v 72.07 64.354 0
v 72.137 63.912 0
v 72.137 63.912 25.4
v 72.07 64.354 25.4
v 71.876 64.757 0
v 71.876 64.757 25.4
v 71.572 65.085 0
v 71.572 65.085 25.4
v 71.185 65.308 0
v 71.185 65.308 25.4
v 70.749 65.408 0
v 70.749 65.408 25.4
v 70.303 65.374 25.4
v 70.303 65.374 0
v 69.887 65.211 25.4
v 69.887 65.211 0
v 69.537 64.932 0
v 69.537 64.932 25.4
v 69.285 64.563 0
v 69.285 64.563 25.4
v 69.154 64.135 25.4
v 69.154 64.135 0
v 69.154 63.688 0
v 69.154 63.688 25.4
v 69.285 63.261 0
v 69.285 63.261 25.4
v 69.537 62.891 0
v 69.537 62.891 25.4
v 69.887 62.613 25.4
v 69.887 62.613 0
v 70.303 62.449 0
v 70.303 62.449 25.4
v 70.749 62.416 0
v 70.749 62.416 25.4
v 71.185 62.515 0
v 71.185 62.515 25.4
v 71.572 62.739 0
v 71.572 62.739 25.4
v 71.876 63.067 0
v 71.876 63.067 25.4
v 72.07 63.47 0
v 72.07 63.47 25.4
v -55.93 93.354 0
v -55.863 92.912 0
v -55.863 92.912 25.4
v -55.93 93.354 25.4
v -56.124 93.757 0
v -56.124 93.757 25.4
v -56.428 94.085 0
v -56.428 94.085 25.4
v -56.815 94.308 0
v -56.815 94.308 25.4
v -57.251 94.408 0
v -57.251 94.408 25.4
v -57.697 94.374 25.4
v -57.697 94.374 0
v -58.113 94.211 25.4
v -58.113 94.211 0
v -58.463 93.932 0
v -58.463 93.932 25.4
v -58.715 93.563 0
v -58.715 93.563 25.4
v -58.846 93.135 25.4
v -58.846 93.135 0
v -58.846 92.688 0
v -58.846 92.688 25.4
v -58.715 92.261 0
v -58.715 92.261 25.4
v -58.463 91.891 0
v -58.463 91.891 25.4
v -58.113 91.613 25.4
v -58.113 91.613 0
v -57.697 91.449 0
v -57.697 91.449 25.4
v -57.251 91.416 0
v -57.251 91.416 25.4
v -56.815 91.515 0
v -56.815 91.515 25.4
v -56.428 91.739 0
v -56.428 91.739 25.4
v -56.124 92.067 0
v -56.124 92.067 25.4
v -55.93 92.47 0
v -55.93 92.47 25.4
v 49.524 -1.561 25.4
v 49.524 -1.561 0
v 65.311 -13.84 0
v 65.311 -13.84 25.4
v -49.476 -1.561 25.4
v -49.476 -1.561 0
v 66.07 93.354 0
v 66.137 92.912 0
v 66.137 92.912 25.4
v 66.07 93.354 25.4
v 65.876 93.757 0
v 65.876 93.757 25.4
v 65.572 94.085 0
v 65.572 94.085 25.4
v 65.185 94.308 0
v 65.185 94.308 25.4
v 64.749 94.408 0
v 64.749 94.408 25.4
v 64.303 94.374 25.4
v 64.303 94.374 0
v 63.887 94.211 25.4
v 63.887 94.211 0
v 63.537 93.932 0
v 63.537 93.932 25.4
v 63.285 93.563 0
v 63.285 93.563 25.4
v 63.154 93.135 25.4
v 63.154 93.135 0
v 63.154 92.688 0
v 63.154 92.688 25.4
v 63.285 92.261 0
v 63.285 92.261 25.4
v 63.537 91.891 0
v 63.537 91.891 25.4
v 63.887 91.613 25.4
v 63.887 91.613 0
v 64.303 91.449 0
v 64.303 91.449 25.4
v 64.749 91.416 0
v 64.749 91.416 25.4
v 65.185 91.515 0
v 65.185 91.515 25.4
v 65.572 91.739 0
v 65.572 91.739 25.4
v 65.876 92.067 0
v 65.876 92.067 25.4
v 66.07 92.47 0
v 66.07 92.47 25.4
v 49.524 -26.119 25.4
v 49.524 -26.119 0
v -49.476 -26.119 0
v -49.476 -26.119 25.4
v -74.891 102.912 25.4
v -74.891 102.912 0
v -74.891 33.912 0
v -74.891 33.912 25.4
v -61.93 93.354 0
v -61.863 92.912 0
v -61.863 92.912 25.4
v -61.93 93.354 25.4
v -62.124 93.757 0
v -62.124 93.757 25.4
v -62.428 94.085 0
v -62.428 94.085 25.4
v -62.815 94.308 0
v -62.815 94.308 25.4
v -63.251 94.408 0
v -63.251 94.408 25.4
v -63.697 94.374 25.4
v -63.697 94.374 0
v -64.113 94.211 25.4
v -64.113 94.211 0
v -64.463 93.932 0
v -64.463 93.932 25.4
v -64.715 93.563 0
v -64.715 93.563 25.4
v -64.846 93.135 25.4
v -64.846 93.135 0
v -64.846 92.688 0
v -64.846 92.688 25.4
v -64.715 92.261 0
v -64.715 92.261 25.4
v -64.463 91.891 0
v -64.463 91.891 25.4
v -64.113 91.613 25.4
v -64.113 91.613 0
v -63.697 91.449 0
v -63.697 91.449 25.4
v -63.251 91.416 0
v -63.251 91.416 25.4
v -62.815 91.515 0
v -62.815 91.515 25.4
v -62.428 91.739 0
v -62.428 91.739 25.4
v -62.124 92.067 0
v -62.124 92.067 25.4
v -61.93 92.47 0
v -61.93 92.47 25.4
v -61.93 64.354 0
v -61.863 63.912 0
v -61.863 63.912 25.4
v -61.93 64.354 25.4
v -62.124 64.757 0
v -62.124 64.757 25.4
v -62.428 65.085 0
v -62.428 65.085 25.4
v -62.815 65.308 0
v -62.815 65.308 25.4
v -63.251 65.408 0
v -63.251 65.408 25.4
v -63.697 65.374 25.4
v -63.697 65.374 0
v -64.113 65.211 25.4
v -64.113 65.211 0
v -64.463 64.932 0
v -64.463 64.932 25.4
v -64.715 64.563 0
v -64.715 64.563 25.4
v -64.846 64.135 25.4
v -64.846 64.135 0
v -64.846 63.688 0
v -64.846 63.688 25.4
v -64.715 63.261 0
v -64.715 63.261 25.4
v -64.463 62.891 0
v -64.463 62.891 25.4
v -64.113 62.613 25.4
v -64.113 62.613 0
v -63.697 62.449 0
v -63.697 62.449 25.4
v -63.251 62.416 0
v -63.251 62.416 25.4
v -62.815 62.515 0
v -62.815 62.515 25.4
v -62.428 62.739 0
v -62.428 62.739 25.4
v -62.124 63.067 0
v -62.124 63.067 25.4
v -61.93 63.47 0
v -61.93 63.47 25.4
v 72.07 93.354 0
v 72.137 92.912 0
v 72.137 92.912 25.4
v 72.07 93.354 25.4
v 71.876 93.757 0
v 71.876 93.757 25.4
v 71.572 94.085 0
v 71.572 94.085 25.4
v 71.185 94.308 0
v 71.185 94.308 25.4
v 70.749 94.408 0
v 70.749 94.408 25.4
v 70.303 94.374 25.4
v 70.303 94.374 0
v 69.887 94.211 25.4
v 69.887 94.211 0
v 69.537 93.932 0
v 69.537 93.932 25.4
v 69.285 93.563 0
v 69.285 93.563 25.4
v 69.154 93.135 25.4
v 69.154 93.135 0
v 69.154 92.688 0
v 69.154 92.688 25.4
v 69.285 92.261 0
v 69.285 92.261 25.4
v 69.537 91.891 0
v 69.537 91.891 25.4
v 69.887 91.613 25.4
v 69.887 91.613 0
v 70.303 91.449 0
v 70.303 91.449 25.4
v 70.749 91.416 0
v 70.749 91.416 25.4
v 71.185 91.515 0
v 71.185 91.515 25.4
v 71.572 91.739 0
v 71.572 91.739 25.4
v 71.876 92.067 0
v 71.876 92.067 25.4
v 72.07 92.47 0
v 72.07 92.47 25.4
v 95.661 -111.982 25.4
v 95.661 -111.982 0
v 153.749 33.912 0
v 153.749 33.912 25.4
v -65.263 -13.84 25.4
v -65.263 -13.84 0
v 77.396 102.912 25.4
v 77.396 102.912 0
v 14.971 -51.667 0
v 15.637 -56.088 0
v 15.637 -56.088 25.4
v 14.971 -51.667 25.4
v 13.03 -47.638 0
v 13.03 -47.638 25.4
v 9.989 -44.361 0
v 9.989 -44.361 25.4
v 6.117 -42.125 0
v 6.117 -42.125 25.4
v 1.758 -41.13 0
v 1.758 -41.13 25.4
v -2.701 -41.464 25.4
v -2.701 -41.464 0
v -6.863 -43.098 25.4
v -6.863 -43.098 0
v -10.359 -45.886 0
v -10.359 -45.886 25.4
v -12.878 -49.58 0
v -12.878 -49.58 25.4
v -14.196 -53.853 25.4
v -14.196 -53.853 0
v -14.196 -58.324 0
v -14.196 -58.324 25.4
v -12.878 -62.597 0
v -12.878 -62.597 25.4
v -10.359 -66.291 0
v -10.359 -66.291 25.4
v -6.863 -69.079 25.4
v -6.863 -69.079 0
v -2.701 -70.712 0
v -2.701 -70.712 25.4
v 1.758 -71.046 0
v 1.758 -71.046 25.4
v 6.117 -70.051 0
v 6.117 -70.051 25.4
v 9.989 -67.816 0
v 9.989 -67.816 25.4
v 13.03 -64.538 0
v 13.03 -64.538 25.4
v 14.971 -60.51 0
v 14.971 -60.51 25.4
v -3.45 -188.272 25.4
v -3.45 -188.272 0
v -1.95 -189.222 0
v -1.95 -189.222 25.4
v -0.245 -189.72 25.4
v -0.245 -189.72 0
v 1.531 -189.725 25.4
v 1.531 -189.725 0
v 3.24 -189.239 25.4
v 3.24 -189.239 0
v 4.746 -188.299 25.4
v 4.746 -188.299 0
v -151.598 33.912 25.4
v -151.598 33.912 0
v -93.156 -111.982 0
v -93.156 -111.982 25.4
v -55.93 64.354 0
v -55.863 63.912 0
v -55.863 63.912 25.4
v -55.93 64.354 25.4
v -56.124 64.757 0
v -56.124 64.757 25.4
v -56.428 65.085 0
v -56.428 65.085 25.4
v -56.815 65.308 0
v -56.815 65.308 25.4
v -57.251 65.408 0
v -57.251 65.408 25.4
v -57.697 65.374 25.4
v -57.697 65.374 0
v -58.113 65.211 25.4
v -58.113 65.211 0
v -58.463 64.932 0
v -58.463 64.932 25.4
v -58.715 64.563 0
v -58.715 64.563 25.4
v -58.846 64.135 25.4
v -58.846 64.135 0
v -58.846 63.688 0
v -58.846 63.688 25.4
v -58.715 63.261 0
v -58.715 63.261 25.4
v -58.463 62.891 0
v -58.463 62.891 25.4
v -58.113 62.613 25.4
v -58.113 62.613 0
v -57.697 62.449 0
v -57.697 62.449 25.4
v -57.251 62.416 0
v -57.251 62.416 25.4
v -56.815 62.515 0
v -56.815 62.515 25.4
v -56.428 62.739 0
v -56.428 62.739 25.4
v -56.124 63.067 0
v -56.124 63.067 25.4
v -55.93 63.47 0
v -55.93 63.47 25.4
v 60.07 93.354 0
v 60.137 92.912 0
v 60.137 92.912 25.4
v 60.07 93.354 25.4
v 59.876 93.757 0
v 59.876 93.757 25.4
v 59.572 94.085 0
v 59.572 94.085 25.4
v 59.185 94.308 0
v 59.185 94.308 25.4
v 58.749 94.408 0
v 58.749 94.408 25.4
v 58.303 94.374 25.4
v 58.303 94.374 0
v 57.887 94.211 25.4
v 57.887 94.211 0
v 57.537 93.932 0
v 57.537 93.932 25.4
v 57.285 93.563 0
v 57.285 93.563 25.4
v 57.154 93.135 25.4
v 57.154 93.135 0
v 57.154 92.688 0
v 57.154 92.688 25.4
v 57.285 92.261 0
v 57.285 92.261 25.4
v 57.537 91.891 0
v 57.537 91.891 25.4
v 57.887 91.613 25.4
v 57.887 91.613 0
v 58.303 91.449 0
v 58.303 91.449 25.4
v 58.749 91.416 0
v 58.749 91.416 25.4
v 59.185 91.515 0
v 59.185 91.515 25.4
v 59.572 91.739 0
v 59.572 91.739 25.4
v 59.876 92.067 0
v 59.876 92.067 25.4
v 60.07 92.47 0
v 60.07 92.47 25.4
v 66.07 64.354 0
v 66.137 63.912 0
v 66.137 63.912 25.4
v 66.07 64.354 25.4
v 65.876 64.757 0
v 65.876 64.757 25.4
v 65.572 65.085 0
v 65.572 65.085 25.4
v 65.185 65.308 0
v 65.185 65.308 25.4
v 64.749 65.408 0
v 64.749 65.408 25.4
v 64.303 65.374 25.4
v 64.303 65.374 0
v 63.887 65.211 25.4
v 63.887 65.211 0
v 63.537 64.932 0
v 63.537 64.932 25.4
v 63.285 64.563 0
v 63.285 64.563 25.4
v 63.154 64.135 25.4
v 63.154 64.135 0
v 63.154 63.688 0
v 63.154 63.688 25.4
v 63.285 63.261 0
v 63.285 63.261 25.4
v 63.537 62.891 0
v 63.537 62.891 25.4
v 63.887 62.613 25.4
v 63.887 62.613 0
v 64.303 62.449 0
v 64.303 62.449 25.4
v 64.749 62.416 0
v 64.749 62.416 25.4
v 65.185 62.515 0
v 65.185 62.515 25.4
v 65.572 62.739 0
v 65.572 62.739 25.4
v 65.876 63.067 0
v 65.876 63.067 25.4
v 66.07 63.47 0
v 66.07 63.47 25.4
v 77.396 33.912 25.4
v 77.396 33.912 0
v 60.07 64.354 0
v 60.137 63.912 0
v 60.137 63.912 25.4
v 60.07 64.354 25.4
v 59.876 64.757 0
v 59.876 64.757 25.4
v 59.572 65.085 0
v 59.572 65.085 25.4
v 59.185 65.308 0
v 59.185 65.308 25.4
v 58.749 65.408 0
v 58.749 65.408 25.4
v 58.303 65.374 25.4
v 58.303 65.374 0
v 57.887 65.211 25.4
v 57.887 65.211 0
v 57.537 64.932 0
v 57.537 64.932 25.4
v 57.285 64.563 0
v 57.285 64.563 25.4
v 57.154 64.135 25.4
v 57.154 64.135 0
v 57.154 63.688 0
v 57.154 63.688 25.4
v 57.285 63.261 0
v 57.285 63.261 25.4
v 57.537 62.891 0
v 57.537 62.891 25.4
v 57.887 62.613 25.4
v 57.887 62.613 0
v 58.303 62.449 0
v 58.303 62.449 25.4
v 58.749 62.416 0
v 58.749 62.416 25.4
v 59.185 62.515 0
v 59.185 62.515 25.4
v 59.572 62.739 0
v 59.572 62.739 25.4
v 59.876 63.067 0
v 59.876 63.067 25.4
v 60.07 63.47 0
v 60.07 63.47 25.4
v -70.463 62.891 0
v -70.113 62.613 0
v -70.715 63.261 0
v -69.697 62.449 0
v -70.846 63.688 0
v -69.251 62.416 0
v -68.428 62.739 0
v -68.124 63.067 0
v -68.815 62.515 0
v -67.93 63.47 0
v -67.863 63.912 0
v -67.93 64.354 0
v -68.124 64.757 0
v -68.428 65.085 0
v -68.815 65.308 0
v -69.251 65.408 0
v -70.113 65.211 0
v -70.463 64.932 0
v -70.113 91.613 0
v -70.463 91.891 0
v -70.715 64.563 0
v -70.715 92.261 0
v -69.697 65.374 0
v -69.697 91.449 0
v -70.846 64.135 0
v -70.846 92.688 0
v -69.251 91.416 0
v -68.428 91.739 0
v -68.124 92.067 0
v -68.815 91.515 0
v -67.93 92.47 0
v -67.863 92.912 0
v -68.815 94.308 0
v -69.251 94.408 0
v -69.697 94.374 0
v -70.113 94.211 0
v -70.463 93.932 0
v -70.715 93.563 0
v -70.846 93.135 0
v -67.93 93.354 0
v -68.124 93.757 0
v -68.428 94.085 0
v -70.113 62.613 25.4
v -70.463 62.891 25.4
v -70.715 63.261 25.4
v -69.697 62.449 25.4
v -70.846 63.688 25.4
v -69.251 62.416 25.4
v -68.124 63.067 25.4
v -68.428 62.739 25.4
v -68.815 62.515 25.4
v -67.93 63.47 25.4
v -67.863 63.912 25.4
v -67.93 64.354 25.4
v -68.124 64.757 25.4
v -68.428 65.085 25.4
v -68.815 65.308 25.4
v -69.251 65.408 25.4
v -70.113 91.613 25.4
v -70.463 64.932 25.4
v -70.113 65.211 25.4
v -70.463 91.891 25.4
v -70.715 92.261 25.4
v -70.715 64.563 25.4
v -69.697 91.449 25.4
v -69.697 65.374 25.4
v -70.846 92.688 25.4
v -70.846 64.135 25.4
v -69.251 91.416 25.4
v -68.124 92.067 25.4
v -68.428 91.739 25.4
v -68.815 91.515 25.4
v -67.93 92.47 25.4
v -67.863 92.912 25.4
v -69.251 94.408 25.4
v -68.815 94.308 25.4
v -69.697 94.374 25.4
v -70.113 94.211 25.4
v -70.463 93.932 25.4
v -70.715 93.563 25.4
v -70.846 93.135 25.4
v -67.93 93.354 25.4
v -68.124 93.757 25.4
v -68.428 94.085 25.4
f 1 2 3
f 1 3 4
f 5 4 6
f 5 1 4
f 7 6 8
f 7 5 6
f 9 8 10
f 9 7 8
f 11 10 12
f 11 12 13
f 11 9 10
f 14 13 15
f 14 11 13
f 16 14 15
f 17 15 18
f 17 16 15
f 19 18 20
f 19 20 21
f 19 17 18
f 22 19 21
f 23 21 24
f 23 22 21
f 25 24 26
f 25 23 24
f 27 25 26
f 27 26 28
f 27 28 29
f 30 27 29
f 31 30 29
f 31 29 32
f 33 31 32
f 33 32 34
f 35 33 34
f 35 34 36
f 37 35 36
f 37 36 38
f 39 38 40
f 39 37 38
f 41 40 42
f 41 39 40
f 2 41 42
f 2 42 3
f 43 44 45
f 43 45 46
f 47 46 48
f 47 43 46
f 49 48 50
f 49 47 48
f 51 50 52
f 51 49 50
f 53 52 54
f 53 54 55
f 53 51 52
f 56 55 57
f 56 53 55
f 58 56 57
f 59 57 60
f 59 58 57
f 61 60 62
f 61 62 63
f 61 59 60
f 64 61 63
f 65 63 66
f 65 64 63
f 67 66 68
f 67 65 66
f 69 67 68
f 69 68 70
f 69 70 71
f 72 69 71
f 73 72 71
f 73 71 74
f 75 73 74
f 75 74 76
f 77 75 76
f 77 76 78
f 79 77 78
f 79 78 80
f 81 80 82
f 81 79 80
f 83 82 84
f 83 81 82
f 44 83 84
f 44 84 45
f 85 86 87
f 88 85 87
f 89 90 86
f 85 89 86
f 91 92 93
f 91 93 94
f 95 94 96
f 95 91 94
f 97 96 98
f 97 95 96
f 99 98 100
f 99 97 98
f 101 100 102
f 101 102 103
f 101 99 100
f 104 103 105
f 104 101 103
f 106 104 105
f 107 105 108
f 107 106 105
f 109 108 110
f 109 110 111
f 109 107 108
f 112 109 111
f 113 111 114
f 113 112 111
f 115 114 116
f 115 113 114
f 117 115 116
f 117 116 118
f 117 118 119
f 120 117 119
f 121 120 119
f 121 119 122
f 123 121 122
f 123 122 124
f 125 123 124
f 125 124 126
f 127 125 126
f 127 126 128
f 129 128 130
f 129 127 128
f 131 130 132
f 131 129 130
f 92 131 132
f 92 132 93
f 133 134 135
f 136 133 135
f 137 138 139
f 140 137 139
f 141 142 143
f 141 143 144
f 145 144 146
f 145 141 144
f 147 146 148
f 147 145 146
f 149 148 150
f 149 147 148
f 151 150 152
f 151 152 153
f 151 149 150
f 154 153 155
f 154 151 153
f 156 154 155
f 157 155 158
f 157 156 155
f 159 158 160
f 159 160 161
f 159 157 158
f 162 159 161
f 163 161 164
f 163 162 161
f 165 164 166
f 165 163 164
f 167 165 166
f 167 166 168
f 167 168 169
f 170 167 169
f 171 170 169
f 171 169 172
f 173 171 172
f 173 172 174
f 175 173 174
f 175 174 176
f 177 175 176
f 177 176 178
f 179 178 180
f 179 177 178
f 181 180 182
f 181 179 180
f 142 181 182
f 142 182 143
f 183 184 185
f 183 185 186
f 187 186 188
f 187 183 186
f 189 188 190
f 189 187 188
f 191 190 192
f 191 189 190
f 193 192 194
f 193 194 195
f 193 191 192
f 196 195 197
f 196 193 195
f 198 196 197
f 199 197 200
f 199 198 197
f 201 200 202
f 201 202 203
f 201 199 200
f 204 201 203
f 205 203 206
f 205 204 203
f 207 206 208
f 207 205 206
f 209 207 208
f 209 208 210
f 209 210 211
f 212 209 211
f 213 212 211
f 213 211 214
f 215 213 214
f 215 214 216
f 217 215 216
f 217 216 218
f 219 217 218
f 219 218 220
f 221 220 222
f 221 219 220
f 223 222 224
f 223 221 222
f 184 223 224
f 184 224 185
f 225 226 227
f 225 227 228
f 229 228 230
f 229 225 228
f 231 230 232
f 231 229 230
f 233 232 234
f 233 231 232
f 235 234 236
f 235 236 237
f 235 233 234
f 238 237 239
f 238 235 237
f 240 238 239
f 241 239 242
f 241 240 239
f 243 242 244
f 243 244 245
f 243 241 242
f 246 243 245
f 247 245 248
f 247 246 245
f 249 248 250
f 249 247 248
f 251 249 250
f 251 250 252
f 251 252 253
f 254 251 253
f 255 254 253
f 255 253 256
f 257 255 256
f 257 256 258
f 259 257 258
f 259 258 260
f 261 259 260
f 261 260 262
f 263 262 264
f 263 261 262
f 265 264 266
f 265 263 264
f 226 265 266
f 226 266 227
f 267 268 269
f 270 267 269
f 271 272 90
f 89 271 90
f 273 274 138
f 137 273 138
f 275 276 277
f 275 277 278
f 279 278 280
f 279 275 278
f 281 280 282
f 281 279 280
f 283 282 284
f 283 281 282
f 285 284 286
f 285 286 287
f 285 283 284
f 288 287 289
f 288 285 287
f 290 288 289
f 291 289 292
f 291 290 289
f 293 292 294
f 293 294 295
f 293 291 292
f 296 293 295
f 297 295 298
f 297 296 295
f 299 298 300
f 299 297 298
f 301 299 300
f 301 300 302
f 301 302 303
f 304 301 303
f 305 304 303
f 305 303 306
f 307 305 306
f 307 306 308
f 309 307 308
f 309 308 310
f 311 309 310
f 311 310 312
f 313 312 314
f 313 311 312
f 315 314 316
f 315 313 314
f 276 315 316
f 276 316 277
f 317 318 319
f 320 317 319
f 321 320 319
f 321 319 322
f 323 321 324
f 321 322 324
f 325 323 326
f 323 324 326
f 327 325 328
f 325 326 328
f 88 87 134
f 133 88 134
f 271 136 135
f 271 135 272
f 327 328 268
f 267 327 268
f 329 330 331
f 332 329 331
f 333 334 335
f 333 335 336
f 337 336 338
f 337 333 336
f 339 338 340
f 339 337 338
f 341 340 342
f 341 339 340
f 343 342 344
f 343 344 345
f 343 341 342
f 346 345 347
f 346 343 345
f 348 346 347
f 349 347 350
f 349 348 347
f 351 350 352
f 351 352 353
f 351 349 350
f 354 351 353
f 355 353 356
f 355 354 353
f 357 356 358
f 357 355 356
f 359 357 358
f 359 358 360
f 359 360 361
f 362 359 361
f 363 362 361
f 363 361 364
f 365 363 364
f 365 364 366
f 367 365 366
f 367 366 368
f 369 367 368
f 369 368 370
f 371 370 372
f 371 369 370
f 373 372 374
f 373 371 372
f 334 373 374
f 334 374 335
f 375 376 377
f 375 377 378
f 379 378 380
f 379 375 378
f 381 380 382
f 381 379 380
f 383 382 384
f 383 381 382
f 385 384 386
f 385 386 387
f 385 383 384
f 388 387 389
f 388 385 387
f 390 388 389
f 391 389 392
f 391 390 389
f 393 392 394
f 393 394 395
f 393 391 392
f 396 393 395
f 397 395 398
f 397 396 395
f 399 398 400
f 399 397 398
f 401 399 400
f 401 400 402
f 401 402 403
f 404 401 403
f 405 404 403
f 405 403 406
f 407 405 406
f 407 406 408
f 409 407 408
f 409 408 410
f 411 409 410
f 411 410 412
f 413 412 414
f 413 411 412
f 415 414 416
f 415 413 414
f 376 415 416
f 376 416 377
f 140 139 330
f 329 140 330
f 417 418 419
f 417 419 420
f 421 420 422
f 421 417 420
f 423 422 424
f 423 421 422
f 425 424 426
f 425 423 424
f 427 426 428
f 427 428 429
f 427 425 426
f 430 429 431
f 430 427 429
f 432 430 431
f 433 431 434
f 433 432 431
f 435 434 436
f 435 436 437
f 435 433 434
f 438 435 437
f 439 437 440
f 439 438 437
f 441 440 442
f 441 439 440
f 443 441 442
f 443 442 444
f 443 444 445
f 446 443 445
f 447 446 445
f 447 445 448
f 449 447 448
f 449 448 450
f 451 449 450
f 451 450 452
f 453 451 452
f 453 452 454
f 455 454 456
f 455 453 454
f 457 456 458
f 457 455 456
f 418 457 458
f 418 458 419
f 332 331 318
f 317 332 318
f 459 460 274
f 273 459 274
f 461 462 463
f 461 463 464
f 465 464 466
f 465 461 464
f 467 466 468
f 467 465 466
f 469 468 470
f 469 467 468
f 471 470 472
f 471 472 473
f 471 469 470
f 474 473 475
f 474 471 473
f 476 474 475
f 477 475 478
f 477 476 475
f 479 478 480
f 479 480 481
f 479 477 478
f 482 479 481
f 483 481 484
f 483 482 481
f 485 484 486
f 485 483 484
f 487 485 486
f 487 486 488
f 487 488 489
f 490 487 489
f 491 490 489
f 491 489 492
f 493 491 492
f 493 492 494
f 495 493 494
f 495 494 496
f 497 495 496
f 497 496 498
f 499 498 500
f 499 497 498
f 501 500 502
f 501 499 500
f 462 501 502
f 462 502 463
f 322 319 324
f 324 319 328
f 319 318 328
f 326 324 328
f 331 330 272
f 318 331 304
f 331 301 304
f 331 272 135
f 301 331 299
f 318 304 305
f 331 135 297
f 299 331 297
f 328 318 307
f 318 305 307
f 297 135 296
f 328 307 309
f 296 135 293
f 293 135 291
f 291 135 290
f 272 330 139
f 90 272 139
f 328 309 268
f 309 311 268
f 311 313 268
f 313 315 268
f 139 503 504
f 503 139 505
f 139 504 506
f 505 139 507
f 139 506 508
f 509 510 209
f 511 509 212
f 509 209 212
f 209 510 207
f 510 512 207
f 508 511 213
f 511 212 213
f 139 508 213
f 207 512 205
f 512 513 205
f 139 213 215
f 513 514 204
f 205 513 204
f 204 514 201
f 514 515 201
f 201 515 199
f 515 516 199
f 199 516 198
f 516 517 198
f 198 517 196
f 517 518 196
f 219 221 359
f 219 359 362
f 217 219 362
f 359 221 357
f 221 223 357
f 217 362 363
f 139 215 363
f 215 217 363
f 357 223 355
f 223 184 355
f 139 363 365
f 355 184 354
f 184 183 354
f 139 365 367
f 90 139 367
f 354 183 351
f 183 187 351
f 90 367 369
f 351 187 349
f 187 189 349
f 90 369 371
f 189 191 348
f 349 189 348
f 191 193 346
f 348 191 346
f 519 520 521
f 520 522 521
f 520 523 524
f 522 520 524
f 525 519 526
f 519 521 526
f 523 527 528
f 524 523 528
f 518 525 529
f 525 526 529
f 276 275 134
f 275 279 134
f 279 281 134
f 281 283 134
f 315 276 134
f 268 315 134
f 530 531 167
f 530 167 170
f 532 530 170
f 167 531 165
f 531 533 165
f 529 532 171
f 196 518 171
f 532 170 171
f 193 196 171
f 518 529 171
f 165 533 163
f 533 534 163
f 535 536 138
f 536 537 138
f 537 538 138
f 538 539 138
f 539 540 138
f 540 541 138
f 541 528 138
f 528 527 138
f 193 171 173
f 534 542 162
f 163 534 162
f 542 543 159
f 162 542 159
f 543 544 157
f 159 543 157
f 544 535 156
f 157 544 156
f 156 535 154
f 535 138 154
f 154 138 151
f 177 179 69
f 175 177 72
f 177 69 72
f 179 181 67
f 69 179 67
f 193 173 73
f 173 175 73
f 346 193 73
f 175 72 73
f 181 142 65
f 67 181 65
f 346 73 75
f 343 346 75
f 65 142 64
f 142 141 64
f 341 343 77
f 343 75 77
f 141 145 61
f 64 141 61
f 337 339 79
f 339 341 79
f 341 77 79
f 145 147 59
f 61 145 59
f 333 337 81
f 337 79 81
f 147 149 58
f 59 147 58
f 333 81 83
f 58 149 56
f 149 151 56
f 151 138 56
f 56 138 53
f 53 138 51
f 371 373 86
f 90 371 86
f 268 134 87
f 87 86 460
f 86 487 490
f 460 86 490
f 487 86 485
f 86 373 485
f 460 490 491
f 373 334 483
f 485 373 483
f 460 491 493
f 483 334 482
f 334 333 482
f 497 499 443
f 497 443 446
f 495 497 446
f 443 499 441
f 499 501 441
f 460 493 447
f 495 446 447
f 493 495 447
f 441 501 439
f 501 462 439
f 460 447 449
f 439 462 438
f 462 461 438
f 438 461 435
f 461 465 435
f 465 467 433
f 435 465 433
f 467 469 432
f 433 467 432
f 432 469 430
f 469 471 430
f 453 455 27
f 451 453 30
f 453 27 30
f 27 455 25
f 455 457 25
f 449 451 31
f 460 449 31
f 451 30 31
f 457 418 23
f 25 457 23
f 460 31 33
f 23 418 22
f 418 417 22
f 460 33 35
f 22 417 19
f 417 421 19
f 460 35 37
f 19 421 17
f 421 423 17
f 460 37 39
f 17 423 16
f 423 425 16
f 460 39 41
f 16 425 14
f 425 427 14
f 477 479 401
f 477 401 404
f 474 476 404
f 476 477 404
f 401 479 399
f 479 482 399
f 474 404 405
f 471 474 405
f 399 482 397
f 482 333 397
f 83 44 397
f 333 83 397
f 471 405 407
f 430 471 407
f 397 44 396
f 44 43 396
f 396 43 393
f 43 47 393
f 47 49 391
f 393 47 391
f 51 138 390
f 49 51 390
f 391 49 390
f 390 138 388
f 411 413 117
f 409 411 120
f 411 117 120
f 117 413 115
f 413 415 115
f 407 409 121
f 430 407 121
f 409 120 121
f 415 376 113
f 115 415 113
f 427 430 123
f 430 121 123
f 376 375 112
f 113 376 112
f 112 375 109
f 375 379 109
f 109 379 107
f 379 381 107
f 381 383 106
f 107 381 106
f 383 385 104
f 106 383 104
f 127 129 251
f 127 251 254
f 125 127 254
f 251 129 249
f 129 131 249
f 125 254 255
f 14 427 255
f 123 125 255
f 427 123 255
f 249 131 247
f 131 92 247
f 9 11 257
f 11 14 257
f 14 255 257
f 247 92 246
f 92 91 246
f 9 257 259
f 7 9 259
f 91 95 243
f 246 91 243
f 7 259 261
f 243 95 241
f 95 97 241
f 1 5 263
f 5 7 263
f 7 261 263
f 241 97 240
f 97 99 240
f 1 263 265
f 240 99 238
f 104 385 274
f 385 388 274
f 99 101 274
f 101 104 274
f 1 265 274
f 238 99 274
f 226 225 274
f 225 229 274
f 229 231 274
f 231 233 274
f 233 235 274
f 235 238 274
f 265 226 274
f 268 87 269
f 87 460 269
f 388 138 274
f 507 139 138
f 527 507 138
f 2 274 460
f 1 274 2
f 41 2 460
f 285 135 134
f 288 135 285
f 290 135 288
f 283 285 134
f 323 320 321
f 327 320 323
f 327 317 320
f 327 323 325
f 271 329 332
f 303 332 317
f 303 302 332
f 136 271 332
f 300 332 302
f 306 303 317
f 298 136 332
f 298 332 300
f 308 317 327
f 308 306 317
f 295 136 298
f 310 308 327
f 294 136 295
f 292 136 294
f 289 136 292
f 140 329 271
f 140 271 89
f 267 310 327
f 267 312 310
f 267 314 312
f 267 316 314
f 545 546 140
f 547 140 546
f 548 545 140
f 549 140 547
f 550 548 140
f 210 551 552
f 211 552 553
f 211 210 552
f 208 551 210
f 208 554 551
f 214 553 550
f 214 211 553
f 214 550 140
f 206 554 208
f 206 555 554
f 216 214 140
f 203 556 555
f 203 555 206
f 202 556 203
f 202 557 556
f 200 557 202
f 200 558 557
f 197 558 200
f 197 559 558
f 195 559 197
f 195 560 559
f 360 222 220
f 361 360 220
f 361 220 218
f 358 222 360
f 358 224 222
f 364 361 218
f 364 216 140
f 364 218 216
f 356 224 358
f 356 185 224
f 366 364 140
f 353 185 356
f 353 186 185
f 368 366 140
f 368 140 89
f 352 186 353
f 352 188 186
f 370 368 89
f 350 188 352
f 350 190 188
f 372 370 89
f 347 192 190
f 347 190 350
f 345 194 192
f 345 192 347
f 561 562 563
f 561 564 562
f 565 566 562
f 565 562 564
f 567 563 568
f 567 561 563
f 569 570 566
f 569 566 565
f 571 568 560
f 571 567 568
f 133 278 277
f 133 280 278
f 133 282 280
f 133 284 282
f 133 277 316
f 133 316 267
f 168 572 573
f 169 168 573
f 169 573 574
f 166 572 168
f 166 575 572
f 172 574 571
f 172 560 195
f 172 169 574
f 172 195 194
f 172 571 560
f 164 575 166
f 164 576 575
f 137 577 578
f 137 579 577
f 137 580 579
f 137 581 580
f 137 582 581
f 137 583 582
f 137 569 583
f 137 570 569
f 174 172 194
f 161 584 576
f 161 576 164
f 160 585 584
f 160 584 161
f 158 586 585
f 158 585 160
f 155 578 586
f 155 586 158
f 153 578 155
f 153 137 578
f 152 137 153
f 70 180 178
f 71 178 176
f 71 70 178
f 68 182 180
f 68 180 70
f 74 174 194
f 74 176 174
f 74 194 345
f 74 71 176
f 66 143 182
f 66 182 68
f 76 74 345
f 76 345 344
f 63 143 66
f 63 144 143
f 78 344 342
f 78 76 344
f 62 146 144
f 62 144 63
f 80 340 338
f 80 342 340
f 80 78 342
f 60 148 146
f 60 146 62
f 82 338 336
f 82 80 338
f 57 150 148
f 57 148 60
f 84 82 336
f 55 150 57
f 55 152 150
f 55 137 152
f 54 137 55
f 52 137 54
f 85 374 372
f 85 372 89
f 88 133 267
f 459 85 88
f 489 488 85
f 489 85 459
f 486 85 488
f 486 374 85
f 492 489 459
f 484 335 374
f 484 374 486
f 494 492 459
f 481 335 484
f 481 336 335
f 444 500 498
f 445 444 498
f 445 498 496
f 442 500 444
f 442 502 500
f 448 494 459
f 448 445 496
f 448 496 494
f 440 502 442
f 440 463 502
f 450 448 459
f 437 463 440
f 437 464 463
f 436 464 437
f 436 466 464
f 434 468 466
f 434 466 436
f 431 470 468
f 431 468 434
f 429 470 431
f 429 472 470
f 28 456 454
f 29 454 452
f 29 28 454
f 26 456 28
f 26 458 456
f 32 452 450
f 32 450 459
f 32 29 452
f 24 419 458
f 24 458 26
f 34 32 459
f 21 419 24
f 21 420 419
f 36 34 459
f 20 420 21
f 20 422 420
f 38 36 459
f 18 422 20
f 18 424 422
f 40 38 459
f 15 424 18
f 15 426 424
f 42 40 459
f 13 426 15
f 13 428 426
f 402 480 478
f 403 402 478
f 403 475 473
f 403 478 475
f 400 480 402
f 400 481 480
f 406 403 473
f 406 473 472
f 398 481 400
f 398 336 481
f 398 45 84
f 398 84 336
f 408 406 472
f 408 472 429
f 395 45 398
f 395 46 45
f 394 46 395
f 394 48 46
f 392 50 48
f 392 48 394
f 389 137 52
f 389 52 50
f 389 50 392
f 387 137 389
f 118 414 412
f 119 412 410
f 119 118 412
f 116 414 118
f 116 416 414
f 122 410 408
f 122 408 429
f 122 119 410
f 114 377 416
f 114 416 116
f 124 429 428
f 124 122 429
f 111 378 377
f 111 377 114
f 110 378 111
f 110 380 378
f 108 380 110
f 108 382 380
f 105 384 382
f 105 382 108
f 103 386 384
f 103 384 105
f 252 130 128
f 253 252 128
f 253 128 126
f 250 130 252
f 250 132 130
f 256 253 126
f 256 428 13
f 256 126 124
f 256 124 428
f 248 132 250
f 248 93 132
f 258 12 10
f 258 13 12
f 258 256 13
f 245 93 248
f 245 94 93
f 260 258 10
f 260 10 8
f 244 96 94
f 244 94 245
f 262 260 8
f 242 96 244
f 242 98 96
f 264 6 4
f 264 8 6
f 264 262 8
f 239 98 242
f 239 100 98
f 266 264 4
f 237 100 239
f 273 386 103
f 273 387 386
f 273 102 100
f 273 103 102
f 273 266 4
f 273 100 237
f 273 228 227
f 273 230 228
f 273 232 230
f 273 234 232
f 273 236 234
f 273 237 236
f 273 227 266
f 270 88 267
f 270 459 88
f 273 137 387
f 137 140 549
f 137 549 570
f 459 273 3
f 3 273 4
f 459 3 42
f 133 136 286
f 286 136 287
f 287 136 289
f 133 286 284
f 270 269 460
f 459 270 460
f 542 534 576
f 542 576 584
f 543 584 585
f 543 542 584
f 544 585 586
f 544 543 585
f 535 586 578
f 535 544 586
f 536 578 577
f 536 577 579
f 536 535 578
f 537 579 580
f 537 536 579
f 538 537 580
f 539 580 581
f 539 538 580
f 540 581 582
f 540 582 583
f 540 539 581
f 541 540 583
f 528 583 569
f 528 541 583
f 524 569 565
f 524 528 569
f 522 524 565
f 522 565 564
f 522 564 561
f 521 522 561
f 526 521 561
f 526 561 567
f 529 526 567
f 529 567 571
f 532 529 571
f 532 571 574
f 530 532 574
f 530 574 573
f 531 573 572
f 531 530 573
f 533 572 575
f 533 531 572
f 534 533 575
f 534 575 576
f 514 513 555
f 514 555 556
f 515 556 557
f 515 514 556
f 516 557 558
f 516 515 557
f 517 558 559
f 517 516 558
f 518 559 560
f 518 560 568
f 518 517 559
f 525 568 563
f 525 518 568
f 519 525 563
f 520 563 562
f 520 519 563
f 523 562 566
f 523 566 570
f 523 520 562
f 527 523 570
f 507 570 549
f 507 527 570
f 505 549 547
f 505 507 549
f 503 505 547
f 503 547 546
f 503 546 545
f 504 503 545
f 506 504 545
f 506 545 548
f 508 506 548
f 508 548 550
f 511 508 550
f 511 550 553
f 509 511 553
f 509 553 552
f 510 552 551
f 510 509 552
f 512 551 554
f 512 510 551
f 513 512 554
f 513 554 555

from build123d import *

# Parameters (mm, degrees)
F0_R     = 15
F0_R_2   = 1.5
F1_DEPTH = 25.4


with BuildPart() as f1:
    # F0 (on Top) → F1 (new body)
    with BuildSketch(Plane.XY):
        with BuildLine():
            Line((77.3958978424, 102.9117530549), (-74.8905959537, 102.9117530549))
            Line((-74.8905959537, 102.9117530549), (-74.8905959537, 33.9117530549))
            Line((-74.8905959537, 33.9117530549), (-93.1560286085, 25.7647309037))
            Line((-93.1560286085, 25.7647309037), (-93.1560286085, -111.9823026415))
            Line((-93.1560286085, -111.9823026415), (-3.4501732079, -188.27225021))
            ThreePointArc((-3.4501732079, -188.27225021), (0.6432284934, -189.7849664775), (4.7462730705, -188.2986040749))
            Line((4.7462730705, -188.2986040749), (95.6613304972, -111.9823026415))
            Line((95.6613304972, -111.9823026415), (95.6613304972, 25.7647309037))
            Line((95.6613304972, 25.7647309037), (77.3958978424, 33.9117530549))
            Line((77.3958978424, 33.9117530549), (77.3958978424, 102.9117530549))
        make_face()
        with Locations((0.6369164785, -56.0882469451)):
            Circle(F0_R, mode=Mode.SUBTRACT)
        Polygon((-49.4758075681, -26.1185521963), (-65.2628552972, -13.8397442737), (-49.4758075681, -1.5609363511), (49.5241924319, -1.5609363511), (65.311240161, -13.8397442737), (49.5241924319, -26.1185521963), align=None, mode=Mode.SUBTRACT)
        with Locations((-69.3630835215, 63.9117530549)):
            Circle(F0_R_2, mode=Mode.SUBTRACT)
        with Locations((-63.3630835215, 63.9117530549)):
            Circle(F0_R_2, mode=Mode.SUBTRACT)
        with Locations((-57.3630835215, 63.9117530549)):
            Circle(F0_R_2, mode=Mode.SUBTRACT)
        with Locations((-69.3630835215, 92.9117530549)):
            Circle(F0_R_2, mode=Mode.SUBTRACT)
        with Locations((-63.3630835215, 92.9117530549)):
            Circle(F0_R_2, mode=Mode.SUBTRACT)
        with Locations((-57.3630835215, 92.9117530549)):
            Circle(F0_R_2, mode=Mode.SUBTRACT)
        with Locations((58.6369164785, 63.9117530549)):
            Circle(F0_R_2, mode=Mode.SUBTRACT)
        with Locations((64.6369164785, 63.9117530549)):
            Circle(F0_R_2, mode=Mode.SUBTRACT)
        with Locations((70.6369164785, 63.9117530549)):
            Circle(F0_R_2, mode=Mode.SUBTRACT)
        with Locations((58.6369164785, 92.9117530549)):
            Circle(F0_R_2, mode=Mode.SUBTRACT)
        with Locations((64.6369164785, 92.9117530549)):
            Circle(F0_R_2, mode=Mode.SUBTRACT)
        with Locations((70.6369164785, 92.9117530549)):
            Circle(F0_R_2, mode=Mode.SUBTRACT)
        Polygon((-93.1560286085, 25.7647309037), (-74.8905959537, 33.9117530549), (-151.5982151031, 33.9117530549), (-93.1560286085, -111.9823026415), align=None)
        Polygon((153.7487208843, 33.9117530549), (77.3958978424, 33.9117530549), (95.6613304972, 25.7647309037), (95.6613304972, -111.9823026415), align=None)
    extrude(amount=F1_DEPTH)


solid = f1.part
